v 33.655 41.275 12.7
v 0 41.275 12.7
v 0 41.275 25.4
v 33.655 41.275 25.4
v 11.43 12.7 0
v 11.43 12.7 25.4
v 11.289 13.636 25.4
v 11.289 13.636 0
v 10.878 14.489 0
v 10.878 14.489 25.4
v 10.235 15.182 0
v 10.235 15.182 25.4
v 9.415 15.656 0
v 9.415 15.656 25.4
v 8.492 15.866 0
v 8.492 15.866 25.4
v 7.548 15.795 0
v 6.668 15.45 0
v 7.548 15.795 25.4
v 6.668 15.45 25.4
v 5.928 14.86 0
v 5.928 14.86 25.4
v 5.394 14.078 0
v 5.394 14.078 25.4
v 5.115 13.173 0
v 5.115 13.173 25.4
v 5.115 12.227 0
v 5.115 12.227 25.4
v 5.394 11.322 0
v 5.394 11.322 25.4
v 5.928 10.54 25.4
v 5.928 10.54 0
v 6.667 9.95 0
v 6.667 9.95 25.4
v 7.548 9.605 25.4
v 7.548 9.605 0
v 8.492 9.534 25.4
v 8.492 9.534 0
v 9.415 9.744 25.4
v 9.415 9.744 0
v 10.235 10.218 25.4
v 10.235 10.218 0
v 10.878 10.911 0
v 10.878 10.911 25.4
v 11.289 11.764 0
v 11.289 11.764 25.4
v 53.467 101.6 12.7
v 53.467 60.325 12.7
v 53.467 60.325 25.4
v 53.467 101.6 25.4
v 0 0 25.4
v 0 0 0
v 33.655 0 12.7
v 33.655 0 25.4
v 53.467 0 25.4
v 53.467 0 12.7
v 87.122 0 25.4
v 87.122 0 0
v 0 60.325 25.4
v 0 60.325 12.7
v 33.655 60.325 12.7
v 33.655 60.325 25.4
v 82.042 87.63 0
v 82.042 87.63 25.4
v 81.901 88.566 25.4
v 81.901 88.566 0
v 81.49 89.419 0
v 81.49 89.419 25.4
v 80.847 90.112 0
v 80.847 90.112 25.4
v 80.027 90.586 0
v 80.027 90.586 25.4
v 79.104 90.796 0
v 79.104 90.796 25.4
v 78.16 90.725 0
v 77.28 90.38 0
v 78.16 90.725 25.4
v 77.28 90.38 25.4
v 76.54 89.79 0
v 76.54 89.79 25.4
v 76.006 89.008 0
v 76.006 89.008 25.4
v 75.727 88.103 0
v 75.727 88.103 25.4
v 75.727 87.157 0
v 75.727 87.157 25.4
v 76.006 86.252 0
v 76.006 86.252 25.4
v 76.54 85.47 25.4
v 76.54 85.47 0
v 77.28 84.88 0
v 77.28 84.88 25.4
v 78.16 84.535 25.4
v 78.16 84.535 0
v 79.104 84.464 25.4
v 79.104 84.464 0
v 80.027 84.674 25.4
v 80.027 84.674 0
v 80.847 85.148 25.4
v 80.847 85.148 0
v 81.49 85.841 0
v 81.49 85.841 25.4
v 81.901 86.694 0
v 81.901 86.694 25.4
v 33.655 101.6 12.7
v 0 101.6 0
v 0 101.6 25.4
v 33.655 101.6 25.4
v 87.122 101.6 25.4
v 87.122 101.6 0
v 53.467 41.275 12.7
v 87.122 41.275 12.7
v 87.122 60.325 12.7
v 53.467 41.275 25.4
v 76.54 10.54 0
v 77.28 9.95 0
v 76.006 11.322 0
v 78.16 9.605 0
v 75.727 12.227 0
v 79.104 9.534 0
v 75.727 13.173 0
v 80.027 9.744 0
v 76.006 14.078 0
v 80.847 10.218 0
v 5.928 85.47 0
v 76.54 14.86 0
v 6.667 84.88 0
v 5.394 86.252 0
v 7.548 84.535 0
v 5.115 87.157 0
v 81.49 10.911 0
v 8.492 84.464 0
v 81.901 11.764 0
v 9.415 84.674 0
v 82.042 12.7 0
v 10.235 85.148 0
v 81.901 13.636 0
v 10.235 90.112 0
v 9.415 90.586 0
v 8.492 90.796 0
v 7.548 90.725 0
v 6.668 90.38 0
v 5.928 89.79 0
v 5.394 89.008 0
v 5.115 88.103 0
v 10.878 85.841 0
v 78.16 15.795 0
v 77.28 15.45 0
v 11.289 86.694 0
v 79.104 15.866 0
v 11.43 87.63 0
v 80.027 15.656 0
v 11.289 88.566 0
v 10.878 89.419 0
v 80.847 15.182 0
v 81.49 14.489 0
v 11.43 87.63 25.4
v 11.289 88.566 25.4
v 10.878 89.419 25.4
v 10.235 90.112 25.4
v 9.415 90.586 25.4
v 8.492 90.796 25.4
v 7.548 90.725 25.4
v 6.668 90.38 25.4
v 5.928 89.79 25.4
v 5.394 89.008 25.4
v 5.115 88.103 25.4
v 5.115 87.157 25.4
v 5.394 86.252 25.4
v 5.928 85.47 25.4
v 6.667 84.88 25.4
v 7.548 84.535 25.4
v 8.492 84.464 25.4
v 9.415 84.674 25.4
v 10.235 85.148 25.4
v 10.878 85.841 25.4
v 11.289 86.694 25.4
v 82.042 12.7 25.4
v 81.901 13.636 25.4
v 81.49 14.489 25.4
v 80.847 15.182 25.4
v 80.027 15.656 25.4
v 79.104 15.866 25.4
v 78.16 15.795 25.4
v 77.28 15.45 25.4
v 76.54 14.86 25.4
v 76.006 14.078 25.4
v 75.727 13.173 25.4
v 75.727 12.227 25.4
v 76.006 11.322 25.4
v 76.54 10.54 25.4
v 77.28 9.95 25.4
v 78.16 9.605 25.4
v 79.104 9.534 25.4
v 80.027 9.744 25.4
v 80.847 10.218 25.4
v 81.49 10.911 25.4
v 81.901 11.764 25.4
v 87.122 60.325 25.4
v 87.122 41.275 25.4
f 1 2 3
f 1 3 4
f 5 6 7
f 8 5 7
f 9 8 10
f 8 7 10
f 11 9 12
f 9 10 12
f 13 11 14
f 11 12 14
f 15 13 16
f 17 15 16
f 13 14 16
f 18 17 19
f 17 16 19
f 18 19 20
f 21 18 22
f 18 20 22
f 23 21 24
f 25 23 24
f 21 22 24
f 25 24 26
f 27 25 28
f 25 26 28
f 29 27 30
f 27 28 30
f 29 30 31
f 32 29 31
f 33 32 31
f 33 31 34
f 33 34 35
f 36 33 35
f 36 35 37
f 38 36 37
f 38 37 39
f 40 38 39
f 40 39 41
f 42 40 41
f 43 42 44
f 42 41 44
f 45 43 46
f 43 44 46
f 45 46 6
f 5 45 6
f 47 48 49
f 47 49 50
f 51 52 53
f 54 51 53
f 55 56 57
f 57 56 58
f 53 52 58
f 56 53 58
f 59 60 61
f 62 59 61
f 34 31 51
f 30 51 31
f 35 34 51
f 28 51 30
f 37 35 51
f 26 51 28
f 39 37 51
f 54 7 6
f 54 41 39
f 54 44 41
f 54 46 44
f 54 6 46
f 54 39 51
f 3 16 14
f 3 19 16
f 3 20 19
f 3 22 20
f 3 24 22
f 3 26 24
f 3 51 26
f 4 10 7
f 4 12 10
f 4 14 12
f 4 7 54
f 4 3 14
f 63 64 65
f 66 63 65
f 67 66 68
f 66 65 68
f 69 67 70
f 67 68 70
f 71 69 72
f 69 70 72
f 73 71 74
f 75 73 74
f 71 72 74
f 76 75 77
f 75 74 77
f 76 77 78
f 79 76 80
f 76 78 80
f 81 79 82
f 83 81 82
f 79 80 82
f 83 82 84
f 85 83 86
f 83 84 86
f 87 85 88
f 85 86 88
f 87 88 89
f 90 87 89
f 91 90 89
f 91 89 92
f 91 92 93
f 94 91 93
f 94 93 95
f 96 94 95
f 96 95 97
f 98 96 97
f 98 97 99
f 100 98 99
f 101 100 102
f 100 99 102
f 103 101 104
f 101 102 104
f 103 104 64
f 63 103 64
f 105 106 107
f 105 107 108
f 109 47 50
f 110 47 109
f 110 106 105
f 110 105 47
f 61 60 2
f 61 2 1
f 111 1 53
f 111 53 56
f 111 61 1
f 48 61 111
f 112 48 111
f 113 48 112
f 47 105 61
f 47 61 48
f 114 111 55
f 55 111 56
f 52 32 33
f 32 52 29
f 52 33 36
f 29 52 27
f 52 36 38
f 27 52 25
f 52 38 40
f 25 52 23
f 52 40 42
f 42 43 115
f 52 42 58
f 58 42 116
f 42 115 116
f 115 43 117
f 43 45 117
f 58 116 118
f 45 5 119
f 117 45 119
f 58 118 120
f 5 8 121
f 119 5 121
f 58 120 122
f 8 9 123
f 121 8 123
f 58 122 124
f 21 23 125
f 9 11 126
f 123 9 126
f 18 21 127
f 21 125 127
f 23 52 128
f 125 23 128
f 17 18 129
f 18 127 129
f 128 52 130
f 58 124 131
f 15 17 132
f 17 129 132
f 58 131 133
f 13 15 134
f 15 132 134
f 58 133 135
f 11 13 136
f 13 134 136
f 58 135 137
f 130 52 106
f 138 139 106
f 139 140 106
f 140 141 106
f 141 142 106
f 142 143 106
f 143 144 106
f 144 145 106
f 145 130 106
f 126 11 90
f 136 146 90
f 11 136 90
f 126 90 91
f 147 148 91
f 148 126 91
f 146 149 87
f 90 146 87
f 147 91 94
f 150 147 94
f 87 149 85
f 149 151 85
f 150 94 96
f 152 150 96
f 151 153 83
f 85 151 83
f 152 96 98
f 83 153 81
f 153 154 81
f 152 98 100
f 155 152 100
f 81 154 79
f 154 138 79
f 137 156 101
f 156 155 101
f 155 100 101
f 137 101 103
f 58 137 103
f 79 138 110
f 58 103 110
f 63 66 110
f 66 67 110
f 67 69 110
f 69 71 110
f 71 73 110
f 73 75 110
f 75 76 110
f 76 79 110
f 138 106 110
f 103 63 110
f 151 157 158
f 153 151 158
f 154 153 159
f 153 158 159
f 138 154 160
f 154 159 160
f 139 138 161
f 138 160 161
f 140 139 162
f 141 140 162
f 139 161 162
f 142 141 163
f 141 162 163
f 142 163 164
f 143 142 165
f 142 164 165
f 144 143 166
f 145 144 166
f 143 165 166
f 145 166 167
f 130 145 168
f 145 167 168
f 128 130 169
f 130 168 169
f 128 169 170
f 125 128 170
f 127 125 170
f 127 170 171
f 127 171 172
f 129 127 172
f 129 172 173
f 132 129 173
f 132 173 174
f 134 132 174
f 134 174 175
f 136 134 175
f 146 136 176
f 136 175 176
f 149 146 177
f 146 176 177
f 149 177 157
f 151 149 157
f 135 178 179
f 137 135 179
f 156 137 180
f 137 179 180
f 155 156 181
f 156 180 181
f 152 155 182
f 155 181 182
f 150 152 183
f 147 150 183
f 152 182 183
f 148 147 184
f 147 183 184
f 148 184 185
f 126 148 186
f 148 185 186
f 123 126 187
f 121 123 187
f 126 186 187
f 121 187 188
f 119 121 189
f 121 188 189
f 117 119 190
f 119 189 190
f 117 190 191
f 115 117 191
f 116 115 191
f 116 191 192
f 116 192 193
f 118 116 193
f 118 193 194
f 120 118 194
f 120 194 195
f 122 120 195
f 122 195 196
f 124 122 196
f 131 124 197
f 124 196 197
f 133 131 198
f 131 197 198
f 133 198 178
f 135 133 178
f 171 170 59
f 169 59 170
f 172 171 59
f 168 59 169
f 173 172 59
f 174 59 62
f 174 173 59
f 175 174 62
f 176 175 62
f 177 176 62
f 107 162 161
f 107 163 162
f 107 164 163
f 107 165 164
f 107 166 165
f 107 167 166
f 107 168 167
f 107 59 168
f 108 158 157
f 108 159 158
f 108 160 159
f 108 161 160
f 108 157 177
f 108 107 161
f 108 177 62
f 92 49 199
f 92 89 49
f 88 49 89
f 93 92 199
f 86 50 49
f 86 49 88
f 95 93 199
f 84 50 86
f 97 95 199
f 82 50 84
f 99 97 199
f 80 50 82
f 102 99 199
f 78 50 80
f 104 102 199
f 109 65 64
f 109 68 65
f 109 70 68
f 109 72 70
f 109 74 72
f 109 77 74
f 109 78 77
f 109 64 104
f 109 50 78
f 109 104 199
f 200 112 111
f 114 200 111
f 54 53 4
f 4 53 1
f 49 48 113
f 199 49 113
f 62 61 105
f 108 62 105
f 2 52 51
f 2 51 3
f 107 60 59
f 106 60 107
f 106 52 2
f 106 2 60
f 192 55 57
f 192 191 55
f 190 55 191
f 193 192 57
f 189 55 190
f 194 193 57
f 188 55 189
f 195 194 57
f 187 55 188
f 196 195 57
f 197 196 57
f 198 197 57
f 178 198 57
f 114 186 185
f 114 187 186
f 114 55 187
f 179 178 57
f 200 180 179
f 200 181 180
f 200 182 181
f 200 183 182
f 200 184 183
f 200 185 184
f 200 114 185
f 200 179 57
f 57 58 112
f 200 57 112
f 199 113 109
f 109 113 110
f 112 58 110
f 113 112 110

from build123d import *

# Parameters (mm, degrees)
F0_W     = 87.122
F0_H     = 101.6
F1_DEPTH = 12.7
F2_W     = 33.655
F2_H     = 41.275
F3_DEPTH = 12.7
F4_R     = 3.175
F5_DEPTH = 25.4


with BuildPart() as f1:
    # F0 (on Top) → F1 (new body)
    with BuildSketch(Plane.XY):
        with Locations((43.561, 50.8)):
            Rectangle(F0_W, F0_H)
    extrude(amount=F1_DEPTH)

    # F2 (on face) → F3 (join)
    with BuildSketch(Plane.XY.offset(12.7)):
        with Locations((16.8275, 80.9625)):
            Rectangle(F2_W, F2_H)
        with Locations((70.2945, 80.9625)):
            Rectangle(F2_W, F2_H)
        Polygon((53.467, 0), (87.122, 0), (87.122, 41.275), (77.888655, 41.275), (73.54703, 41.275), (53.467, 41.275), align=None)
        with Locations((16.8275, 20.6375)):
            Rectangle(F2_W, F2_H)
    extrude(amount=F3_DEPTH)

    # F4 (on face) → F5 (cut)
    with BuildSketch(Plane.XY.offset(25.4)):
        with Locations((78.867, 87.63)):
            Circle(F4_R)
        with Locations((8.255, 87.63)):
            Circle(F4_R)
        with Locations((78.867, 12.7)):
            Circle(F4_R)
        with Locations((8.255, 12.7)):
            Circle(F4_R)
    extrude(amount=-F5_DEPTH, mode=Mode.SUBTRACT)


solid = f1.part
